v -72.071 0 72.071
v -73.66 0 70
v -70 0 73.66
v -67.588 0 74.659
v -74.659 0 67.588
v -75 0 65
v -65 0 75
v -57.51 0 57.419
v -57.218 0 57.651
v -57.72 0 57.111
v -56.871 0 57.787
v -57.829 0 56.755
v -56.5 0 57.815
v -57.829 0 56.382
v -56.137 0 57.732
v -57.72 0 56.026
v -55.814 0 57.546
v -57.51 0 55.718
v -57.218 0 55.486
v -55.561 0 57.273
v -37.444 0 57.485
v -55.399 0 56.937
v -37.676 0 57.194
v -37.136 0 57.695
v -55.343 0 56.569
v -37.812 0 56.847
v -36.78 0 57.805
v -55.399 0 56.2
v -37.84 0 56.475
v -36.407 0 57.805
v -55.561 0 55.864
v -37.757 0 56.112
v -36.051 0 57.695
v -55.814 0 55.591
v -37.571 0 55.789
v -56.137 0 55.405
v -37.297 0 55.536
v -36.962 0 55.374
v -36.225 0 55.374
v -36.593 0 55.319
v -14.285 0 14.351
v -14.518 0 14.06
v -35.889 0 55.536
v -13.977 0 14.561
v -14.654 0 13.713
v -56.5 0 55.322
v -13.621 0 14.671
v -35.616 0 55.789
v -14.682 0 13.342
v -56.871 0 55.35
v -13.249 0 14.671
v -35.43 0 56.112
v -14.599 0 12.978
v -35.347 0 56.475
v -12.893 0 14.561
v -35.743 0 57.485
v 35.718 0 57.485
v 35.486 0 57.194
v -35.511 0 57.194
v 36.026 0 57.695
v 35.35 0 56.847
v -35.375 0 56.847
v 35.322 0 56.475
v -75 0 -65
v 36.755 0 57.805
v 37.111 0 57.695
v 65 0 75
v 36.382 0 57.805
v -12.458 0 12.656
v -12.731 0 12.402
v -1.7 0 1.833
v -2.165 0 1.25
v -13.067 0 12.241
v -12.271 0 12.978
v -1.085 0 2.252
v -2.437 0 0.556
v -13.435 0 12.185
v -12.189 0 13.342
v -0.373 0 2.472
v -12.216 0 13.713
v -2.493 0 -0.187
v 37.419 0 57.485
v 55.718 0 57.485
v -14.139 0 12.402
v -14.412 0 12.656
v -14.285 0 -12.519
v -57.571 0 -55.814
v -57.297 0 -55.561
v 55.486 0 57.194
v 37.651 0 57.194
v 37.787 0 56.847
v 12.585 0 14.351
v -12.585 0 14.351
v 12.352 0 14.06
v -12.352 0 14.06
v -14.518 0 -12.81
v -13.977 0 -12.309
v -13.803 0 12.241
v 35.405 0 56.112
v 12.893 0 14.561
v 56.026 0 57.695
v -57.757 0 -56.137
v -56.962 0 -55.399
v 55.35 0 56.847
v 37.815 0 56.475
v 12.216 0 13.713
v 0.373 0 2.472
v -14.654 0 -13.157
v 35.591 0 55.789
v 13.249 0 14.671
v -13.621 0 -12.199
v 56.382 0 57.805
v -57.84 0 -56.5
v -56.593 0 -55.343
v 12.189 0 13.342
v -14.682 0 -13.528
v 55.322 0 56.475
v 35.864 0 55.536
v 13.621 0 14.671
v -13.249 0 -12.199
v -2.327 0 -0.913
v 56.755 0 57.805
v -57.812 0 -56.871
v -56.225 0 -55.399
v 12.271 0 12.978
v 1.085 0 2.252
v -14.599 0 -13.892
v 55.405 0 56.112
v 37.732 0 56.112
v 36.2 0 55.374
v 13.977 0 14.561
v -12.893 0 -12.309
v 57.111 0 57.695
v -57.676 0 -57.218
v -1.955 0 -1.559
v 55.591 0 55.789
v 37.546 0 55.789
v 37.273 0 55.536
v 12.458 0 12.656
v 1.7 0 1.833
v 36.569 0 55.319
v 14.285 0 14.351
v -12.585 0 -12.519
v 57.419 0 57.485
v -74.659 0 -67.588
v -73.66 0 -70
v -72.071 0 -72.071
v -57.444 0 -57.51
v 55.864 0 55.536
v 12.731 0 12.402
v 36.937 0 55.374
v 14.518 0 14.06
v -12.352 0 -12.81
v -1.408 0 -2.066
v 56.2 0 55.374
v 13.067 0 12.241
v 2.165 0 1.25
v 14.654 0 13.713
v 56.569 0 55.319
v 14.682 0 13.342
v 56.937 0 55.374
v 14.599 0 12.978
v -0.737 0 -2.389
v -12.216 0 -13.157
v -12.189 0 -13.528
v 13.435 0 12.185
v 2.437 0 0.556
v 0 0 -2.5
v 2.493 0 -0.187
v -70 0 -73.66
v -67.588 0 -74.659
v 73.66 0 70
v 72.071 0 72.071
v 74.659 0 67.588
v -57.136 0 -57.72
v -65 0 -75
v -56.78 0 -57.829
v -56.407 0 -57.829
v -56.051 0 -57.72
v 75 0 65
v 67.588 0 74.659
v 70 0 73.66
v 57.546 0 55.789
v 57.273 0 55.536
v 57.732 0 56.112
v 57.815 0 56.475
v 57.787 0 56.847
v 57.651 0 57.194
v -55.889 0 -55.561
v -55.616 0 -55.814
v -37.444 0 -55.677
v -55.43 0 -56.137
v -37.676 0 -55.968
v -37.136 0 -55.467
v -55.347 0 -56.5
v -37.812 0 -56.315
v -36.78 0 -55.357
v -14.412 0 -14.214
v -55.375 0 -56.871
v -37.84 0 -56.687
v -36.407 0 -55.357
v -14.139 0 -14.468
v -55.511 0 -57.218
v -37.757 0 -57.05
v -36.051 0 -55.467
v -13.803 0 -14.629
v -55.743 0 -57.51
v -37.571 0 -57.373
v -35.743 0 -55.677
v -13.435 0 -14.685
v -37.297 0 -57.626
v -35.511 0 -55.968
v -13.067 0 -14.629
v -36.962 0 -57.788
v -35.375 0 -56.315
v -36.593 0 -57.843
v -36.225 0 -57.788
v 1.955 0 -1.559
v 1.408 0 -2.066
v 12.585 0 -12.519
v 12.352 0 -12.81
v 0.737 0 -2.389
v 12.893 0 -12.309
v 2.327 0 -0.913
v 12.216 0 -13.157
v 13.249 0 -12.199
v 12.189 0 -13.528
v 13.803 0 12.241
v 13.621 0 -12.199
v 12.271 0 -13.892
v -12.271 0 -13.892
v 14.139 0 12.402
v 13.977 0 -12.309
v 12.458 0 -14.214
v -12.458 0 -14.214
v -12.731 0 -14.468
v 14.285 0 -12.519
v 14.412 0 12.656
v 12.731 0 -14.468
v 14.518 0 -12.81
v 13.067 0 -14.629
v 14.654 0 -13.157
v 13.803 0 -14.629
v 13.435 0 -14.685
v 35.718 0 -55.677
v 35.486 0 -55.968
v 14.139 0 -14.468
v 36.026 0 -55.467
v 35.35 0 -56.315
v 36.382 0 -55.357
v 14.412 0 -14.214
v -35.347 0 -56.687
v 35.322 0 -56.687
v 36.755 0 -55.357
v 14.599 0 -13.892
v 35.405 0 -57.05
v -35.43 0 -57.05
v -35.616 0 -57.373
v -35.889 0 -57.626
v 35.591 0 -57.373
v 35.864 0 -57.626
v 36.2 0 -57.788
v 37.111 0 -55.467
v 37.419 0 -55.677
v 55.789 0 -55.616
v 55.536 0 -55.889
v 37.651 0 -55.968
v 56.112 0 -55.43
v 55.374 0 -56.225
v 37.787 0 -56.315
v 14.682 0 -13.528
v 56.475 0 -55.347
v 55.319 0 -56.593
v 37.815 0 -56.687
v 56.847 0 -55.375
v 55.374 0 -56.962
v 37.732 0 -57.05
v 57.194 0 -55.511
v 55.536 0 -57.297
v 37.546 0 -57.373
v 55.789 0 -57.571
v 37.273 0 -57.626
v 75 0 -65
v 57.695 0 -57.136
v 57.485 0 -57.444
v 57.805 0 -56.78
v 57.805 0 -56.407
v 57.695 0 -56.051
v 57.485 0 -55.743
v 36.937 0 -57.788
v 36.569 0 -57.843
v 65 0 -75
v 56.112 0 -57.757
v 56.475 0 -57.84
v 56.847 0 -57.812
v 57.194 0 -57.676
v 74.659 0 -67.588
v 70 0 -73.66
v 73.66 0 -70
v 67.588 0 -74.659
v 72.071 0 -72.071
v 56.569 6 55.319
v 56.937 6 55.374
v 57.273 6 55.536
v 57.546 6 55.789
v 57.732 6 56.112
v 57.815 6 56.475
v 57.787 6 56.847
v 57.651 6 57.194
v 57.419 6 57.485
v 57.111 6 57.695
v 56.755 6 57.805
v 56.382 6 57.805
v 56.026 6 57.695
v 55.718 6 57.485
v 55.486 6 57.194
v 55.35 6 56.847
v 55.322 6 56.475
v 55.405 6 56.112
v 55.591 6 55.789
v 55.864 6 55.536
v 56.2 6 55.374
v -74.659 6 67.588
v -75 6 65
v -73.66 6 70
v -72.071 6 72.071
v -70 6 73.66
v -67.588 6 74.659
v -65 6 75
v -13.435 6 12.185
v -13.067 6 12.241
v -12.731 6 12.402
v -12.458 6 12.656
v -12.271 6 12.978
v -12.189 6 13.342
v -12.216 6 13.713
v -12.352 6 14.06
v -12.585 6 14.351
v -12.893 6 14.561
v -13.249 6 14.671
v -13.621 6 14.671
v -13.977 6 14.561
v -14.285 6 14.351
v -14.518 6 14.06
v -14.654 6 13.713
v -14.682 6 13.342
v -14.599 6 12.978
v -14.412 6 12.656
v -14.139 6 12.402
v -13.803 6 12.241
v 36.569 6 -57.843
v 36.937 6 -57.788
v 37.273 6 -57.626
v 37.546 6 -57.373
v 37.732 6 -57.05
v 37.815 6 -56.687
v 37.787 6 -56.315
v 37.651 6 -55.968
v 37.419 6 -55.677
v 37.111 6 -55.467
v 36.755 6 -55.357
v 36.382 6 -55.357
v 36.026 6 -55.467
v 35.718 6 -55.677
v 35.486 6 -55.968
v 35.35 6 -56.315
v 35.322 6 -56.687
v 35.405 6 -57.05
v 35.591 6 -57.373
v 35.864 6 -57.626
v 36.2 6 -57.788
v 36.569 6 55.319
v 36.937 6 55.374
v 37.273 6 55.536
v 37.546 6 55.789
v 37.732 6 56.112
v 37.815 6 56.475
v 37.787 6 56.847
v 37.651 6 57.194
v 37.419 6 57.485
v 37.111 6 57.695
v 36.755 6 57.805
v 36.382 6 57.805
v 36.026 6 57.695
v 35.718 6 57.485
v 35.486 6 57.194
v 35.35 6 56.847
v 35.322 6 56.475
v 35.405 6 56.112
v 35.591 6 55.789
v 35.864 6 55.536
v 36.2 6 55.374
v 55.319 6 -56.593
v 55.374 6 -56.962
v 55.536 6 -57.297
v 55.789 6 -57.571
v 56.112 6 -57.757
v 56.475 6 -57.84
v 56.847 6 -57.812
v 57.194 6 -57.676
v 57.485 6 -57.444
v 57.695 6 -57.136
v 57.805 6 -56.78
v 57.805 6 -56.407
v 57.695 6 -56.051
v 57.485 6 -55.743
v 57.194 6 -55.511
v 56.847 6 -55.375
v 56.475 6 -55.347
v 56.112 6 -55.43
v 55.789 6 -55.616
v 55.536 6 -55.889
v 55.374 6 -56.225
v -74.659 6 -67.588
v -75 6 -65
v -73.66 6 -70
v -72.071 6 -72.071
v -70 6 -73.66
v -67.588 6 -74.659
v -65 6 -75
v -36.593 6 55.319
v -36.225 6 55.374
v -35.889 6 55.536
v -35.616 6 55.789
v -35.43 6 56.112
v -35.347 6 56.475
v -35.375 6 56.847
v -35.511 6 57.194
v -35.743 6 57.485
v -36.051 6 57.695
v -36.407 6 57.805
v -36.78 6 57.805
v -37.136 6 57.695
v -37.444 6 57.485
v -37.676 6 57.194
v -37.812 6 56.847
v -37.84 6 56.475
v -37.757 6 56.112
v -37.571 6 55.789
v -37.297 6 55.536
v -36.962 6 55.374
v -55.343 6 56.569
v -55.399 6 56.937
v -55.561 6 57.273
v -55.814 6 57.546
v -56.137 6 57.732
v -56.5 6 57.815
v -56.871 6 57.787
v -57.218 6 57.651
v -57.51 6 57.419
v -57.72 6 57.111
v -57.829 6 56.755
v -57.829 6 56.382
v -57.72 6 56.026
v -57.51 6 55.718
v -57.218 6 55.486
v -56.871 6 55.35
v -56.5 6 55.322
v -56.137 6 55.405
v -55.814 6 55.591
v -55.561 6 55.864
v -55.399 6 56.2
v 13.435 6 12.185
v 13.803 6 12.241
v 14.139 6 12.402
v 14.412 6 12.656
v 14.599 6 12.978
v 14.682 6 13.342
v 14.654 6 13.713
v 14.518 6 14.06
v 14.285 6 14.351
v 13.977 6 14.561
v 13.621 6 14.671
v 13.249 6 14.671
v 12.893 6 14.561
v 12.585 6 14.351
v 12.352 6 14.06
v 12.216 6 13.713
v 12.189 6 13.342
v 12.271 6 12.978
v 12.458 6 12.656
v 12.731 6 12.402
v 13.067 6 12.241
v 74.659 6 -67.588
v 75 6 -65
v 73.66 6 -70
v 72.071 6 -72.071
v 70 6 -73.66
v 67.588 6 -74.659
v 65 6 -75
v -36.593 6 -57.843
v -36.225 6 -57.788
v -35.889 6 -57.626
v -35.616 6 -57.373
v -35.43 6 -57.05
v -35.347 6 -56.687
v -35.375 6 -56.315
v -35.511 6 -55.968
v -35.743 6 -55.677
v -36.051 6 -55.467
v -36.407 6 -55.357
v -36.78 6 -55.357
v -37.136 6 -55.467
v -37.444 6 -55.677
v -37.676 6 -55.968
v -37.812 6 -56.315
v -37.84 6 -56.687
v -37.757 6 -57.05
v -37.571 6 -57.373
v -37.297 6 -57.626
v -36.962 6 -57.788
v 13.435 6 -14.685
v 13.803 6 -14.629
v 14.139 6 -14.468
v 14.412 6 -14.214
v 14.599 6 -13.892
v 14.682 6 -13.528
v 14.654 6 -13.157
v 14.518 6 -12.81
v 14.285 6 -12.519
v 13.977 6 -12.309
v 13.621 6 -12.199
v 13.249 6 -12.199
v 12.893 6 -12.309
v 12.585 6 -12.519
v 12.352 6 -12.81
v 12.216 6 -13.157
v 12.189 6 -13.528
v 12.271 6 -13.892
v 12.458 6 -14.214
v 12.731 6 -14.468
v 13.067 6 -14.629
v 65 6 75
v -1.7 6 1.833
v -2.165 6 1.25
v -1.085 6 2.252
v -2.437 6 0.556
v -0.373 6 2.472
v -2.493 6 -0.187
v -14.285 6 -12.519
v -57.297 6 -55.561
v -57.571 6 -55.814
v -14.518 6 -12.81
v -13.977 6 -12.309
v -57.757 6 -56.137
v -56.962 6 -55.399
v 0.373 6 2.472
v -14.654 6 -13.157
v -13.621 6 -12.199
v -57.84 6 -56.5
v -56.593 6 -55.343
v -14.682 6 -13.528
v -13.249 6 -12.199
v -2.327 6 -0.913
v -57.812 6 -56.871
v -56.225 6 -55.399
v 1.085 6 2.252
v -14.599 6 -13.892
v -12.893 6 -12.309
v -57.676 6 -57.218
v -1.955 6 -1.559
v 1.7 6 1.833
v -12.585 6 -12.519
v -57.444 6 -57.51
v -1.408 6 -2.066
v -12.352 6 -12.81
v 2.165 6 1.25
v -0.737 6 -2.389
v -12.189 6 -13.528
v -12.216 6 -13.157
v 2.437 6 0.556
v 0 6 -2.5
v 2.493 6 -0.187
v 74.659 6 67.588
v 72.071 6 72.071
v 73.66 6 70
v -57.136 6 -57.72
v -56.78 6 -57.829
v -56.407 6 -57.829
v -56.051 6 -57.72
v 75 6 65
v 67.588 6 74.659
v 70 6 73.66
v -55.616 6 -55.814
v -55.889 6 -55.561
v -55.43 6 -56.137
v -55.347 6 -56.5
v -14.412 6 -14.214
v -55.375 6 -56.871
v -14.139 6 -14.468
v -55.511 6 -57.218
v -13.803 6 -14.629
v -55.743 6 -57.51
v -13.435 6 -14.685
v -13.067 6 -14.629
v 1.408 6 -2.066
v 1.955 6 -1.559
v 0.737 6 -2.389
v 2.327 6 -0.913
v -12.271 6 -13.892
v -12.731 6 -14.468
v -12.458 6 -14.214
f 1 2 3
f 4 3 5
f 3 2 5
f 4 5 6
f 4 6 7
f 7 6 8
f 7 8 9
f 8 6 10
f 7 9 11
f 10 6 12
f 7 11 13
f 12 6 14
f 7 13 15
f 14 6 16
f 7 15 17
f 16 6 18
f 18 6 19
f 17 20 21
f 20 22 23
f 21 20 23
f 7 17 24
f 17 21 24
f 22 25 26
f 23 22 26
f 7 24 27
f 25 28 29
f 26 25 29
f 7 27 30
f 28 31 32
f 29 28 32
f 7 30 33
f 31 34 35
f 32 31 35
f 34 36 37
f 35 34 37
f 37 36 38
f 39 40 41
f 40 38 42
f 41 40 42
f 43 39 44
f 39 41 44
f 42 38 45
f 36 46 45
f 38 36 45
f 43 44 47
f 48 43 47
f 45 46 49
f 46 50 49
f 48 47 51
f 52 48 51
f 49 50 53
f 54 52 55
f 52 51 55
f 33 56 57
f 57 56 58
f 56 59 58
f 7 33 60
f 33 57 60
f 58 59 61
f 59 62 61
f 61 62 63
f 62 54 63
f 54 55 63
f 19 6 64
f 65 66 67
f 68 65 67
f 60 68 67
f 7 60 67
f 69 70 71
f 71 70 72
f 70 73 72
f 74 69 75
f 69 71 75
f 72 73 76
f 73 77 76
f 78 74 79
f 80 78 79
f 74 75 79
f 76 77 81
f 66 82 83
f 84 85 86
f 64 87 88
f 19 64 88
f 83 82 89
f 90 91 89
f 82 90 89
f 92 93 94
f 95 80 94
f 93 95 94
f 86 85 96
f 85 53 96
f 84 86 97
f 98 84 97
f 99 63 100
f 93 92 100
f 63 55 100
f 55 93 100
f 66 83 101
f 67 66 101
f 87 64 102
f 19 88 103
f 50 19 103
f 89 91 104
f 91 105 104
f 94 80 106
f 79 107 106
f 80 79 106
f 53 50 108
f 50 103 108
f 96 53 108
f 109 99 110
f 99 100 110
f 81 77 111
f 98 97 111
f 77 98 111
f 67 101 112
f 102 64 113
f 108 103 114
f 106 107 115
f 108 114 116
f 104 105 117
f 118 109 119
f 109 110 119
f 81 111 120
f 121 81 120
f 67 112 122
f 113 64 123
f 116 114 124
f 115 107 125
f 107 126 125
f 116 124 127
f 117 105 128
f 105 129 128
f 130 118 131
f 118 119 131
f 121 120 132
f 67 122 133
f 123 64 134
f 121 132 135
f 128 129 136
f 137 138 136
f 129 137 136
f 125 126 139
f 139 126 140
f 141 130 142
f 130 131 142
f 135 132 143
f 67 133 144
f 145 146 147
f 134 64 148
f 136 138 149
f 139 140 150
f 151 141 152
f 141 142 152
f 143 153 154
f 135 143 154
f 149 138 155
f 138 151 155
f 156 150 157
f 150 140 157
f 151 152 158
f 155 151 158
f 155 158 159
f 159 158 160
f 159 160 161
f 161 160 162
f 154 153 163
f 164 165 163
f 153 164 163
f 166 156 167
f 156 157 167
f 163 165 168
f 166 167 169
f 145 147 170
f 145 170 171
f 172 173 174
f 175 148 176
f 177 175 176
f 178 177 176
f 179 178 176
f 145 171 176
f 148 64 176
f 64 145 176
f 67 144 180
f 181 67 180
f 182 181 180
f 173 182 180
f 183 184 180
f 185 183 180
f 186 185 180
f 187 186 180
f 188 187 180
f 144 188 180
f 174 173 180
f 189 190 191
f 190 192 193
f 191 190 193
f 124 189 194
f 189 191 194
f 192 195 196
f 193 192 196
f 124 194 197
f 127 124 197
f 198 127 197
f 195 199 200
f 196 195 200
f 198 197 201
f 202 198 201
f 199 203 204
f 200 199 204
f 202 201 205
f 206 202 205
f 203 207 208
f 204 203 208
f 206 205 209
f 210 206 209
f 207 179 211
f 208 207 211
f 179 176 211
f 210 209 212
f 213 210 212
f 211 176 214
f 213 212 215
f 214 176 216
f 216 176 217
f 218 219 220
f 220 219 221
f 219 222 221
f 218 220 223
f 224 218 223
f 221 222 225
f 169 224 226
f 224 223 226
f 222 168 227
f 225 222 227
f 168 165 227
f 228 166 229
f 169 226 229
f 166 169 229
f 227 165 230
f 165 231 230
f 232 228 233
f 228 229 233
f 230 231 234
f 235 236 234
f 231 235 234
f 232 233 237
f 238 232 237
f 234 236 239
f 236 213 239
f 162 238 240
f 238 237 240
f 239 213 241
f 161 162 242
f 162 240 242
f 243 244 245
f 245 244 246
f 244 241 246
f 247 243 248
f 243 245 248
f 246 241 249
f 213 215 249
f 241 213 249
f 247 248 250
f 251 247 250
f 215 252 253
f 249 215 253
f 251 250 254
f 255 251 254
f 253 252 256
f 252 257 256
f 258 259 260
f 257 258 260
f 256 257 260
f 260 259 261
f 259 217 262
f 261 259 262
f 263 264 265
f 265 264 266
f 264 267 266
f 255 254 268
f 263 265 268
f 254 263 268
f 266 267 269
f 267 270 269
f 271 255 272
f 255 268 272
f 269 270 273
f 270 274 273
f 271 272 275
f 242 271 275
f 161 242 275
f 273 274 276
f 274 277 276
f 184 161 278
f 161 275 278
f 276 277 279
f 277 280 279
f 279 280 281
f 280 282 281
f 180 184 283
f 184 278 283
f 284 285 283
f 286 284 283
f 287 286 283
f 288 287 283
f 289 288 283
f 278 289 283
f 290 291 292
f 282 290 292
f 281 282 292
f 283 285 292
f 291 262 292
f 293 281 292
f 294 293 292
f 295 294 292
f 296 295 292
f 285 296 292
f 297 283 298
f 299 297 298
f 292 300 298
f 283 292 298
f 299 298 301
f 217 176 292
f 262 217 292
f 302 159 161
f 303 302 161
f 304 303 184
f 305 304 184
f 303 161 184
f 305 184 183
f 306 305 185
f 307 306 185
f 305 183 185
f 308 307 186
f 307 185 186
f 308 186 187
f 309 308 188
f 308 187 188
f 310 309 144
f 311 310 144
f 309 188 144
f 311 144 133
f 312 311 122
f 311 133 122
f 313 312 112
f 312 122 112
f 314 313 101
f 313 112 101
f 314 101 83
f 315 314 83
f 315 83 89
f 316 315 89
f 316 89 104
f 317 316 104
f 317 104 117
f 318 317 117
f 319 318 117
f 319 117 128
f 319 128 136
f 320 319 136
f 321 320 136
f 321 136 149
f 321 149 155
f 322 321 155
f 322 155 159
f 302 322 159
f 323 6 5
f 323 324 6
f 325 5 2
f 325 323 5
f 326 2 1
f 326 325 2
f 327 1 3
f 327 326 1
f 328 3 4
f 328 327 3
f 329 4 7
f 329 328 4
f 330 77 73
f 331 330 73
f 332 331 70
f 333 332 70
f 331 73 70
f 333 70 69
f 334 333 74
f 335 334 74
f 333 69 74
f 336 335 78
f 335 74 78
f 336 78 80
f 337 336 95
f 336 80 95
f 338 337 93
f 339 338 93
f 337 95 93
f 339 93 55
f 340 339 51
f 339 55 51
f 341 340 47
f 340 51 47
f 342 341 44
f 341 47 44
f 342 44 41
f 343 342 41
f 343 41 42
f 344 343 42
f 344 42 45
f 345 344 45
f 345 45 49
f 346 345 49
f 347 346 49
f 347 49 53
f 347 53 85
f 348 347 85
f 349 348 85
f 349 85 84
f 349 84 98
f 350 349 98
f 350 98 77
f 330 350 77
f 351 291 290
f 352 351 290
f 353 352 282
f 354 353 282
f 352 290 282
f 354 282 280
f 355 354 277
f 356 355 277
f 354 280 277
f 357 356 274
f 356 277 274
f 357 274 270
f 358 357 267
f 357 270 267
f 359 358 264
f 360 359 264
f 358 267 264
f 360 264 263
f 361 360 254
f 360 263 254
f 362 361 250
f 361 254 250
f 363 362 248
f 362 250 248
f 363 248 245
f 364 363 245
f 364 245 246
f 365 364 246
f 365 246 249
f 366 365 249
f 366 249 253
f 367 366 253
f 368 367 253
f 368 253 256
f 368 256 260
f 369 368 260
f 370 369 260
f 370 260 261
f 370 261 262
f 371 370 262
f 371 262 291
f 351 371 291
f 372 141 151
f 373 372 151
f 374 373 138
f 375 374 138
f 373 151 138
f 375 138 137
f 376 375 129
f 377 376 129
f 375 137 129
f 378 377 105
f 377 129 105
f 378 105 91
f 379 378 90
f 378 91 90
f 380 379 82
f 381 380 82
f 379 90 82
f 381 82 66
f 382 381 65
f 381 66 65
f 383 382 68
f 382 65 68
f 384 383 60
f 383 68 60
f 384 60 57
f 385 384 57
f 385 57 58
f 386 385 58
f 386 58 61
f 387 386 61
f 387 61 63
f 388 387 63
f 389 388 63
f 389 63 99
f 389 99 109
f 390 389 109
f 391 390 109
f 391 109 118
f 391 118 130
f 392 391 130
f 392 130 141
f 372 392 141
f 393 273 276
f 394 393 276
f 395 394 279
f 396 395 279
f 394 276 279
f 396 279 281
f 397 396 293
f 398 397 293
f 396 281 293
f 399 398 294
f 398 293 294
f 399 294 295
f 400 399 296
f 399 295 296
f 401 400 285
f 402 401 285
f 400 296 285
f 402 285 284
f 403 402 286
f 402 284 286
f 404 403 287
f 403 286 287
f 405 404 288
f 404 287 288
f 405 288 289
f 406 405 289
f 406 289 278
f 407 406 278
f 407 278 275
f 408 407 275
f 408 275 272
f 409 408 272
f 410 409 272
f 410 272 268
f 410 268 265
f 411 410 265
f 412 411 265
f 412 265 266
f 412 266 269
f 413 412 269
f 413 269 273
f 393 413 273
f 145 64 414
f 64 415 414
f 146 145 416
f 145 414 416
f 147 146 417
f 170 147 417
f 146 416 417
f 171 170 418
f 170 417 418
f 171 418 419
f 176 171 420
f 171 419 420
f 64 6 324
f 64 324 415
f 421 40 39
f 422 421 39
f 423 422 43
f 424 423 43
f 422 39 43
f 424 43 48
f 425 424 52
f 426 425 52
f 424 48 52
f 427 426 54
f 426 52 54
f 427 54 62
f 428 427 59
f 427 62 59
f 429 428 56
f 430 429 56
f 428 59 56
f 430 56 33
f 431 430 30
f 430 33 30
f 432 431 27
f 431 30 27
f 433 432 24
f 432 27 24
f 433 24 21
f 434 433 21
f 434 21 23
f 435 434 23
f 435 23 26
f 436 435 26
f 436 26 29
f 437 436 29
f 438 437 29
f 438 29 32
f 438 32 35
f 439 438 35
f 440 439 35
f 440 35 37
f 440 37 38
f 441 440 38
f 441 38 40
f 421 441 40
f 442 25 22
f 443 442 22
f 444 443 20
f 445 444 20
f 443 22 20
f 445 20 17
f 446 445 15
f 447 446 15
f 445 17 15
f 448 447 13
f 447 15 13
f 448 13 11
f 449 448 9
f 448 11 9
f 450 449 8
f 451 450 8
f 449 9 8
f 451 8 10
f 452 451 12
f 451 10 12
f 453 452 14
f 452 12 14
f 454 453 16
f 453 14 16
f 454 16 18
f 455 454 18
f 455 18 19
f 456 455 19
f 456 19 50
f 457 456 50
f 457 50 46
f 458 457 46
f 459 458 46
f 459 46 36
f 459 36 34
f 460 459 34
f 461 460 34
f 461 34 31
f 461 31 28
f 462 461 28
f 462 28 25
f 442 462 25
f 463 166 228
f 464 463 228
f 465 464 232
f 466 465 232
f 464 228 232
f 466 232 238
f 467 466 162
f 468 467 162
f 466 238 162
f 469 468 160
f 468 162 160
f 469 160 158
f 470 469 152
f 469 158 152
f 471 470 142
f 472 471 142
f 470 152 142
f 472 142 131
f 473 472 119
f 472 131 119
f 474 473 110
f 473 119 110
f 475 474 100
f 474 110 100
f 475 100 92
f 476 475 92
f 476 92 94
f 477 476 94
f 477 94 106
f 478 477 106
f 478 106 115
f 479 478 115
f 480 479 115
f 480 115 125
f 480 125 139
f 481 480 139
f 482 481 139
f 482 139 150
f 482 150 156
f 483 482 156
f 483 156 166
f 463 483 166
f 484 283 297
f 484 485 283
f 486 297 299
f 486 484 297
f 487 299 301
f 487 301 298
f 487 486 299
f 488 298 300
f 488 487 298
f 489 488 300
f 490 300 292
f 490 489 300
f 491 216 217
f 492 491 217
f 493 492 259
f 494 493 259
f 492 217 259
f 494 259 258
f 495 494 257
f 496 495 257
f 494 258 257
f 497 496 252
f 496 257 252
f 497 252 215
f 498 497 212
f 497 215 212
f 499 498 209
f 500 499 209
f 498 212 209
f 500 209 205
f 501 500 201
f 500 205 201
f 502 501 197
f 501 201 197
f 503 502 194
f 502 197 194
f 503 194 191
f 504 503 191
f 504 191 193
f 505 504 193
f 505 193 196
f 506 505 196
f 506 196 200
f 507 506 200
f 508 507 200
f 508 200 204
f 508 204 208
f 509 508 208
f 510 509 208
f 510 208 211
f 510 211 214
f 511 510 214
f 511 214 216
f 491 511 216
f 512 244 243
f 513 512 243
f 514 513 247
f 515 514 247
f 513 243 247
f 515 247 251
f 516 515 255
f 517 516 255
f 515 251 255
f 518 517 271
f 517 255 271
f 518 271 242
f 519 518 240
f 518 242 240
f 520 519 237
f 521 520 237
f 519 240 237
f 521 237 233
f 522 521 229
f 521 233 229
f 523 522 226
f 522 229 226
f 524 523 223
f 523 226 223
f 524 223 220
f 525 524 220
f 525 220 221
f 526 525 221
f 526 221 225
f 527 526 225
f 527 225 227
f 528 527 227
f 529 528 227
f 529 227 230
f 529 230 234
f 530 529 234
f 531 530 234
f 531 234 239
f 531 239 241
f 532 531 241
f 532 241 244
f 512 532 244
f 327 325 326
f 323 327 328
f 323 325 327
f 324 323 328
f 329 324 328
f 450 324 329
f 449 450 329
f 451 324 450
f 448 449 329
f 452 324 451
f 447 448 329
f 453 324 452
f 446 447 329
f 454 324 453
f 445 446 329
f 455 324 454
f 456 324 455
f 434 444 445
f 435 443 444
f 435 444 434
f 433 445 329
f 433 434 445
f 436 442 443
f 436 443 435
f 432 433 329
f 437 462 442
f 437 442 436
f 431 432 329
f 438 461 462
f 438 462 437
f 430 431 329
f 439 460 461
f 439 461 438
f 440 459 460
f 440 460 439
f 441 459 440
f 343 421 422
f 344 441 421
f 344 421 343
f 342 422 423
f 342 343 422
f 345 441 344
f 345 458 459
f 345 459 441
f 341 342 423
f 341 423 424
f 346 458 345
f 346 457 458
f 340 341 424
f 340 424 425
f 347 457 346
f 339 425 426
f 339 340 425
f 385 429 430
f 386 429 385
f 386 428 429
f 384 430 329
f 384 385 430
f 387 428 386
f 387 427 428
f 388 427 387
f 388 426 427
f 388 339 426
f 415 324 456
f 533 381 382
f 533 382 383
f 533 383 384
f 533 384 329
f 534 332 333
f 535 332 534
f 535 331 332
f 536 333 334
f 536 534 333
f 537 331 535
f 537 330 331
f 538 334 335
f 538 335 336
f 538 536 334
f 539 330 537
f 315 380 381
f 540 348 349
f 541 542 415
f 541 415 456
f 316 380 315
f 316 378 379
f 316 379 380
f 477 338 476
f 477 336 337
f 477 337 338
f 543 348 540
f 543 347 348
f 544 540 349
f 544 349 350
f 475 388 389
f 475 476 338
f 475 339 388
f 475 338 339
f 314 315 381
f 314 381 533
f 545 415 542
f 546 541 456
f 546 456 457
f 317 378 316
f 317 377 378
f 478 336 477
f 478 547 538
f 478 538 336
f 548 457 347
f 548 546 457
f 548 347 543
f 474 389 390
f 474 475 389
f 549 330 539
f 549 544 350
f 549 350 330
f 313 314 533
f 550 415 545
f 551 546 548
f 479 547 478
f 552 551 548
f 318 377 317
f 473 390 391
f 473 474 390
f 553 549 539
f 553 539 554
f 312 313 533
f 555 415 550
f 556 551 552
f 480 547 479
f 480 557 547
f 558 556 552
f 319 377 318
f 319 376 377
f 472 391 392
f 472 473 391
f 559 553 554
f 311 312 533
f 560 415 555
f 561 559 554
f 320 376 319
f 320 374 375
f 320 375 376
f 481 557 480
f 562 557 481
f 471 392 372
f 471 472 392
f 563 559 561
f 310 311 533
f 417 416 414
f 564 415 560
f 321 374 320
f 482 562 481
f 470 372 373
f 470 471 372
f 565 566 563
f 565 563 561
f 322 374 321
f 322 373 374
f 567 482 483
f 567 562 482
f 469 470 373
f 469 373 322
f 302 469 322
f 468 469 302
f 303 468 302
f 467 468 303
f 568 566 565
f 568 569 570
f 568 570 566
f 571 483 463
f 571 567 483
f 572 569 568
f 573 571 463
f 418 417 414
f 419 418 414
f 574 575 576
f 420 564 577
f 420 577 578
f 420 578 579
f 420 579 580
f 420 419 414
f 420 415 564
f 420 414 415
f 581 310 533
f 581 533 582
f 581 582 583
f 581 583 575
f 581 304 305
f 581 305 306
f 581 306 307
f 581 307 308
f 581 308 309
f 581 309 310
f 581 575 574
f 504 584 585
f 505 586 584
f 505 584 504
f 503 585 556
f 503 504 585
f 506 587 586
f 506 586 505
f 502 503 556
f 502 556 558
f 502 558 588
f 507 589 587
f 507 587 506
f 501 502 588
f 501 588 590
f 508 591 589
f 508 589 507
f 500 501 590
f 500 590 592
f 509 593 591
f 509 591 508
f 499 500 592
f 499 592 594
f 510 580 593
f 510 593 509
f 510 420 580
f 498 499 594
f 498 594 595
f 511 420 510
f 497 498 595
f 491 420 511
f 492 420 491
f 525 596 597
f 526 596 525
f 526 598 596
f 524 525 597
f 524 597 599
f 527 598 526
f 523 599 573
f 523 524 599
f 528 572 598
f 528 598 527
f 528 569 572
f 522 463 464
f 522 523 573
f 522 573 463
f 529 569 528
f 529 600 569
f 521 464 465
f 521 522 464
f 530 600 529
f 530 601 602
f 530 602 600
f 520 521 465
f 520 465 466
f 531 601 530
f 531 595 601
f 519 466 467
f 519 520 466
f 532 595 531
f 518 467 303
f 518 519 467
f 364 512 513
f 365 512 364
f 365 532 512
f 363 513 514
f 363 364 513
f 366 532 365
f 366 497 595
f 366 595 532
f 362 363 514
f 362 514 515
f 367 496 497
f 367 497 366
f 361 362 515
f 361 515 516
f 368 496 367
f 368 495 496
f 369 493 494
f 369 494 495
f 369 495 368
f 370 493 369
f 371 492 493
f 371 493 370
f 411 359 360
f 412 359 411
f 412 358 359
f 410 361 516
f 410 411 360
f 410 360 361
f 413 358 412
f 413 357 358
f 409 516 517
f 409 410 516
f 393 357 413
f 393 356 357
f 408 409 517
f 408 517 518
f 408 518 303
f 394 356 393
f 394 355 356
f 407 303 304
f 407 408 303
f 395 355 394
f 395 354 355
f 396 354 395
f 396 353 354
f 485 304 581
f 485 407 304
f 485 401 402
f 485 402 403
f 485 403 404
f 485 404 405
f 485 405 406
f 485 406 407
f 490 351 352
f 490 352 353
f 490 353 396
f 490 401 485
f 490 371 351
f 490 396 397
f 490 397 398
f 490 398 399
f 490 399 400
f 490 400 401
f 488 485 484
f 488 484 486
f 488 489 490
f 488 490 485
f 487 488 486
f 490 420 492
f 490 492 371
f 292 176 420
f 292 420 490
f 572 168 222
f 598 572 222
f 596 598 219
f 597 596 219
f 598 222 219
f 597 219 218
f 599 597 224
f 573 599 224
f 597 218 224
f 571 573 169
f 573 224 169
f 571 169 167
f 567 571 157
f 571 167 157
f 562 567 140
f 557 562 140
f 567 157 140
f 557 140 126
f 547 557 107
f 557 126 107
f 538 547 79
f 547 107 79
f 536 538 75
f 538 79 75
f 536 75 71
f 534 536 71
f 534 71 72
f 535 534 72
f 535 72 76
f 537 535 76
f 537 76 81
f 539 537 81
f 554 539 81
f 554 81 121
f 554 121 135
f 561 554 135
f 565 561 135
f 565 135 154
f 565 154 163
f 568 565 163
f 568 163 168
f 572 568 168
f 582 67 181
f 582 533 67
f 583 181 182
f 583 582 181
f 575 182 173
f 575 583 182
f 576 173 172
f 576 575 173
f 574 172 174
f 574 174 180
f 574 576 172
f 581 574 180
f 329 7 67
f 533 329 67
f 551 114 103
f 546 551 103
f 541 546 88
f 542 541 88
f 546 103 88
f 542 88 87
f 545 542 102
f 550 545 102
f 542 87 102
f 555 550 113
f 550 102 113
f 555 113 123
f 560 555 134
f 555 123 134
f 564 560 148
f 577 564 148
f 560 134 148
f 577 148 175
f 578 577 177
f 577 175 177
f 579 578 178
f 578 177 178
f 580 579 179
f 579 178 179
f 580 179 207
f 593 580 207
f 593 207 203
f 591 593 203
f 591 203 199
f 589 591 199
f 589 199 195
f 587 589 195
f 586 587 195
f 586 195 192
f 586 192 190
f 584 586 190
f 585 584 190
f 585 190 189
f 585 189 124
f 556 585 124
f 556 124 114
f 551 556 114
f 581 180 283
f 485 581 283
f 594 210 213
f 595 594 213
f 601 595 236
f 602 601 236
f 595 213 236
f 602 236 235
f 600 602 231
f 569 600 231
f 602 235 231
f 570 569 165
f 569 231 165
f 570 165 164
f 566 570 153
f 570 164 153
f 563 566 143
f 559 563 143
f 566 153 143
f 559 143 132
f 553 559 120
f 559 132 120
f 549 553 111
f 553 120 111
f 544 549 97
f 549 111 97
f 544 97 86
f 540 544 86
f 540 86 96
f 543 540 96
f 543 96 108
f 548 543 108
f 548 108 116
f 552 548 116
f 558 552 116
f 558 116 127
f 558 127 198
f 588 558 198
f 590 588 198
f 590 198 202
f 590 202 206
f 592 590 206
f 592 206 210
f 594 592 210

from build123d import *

# Parameters (mm, degrees)
SKETCH_1_W               = 150
SKETCH_1_H               = 150
EXTRUDE_1_DEPTH          = 6
FILLET_1_R               = 10
SKETCH_3_R               = 1.25
CUT_EXTRUDE_4_DEPTH      = 107.235587258
PATTERN_CIRCULAR_2_COUNT = 4
SKETCH_7_R               = 1.25
CUT_EXTRUDE_11_DEPTH     = 10
SKETCH_9_R               = 1.25
CUT_EXTRUDE_12_DEPTH     = 10
SKETCH_10_R              = 2.5
CUT_EXTRUDE_13_DEPTH     = 10


with BuildPart() as part:
    # 草图1 → 凸台-拉伸1 (new body)
    with BuildSketch(Plane(origin=(0, 0, 0), x_dir=(1, 0, 0), z_dir=(0, 1, 0))):
        Rectangle(SKETCH_1_W, SKETCH_1_H)
    extrude(amount=EXTRUDE_1_DEPTH)

    # 圆角1
    fillet_1_edges = [part.edges().sort_by_distance(p)[0] for p in [
        (75, 3, 75),
        (-75, 3, 75),
        (-75, 3, -75),
        (75, 3, -75),
    ]]
    fillet(fillet_1_edges, radius=FILLET_1_R)

    # 草图3 → 切除-拉伸4 (cut, through all)
    with BuildSketch(Plane.XZ):
        with Locations(Location((56.568542495, 56.568542495, 0), (0, 0, 270))):
            Circle(SKETCH_3_R)
    cut_extrude_4 = extrude(amount=-CUT_EXTRUDE_4_DEPTH, mode=Mode.SUBTRACT)

    # 阵列(圆周)2: 切除-拉伸4 ×4 about axis
    pattern_circular_2_axis = Axis((-0.01239132, 0, -0.01239132), (0, 1, 0))
    for i in range(1, PATTERN_CIRCULAR_2_COUNT):
        add(cut_extrude_4.rotate(pattern_circular_2_axis, i * 360 / PATTERN_CIRCULAR_2_COUNT), mode=Mode.SUBTRACT)

    # 草图7 → 切除-拉伸11 (cut)
    with BuildSketch(Plane.XZ):
        with Locations(Location((-36.593325134, -56.593325134, 0), (0, 0, 270))):
            Circle(SKETCH_7_R)
        with Locations(Location((36.568542495, -56.593325134, 0), (0, 0, 270))):
            Circle(SKETCH_7_R)
        with Locations(Location((-36.593325134, 56.568542495, 0), (0, 0, 270))):
            Circle(SKETCH_7_R)
        with Locations(Location((36.568542495, 56.568542495, 0), (0, 0, 270))):
            Circle(SKETCH_7_R)
    extrude(amount=-CUT_EXTRUDE_11_DEPTH, mode=Mode.SUBTRACT)

    # 草图9 → 切除-拉伸12 (cut)
    with BuildSketch(Plane.XZ):
        with Locations(Location((13.435028843, 13.435028843, 0), (0, 0, 270))):
            Circle(SKETCH_9_R)
        with Locations(Location((13.435028843, -13.435028843, 0), (0, 0, 270))):
            Circle(SKETCH_9_R)
        with Locations(Location((-13.435028843, -13.435028843, 0), (0, 0, 270))):
            Circle(SKETCH_9_R)
        with Locations(Location((-13.435028843, 13.435028843, 0), (0, 0, 270))):
            Circle(SKETCH_9_R)
    extrude(amount=-CUT_EXTRUDE_12_DEPTH, mode=Mode.SUBTRACT)

    # 草图10 → 切除-拉伸13 (cut)
    with BuildSketch(Plane.XZ):
        with Locations(Location((0, 0, 0), (0, 0, 270))):
            Circle(SKETCH_10_R)
    extrude(amount=-CUT_EXTRUDE_13_DEPTH, mode=Mode.SUBTRACT)


solid = part.part
